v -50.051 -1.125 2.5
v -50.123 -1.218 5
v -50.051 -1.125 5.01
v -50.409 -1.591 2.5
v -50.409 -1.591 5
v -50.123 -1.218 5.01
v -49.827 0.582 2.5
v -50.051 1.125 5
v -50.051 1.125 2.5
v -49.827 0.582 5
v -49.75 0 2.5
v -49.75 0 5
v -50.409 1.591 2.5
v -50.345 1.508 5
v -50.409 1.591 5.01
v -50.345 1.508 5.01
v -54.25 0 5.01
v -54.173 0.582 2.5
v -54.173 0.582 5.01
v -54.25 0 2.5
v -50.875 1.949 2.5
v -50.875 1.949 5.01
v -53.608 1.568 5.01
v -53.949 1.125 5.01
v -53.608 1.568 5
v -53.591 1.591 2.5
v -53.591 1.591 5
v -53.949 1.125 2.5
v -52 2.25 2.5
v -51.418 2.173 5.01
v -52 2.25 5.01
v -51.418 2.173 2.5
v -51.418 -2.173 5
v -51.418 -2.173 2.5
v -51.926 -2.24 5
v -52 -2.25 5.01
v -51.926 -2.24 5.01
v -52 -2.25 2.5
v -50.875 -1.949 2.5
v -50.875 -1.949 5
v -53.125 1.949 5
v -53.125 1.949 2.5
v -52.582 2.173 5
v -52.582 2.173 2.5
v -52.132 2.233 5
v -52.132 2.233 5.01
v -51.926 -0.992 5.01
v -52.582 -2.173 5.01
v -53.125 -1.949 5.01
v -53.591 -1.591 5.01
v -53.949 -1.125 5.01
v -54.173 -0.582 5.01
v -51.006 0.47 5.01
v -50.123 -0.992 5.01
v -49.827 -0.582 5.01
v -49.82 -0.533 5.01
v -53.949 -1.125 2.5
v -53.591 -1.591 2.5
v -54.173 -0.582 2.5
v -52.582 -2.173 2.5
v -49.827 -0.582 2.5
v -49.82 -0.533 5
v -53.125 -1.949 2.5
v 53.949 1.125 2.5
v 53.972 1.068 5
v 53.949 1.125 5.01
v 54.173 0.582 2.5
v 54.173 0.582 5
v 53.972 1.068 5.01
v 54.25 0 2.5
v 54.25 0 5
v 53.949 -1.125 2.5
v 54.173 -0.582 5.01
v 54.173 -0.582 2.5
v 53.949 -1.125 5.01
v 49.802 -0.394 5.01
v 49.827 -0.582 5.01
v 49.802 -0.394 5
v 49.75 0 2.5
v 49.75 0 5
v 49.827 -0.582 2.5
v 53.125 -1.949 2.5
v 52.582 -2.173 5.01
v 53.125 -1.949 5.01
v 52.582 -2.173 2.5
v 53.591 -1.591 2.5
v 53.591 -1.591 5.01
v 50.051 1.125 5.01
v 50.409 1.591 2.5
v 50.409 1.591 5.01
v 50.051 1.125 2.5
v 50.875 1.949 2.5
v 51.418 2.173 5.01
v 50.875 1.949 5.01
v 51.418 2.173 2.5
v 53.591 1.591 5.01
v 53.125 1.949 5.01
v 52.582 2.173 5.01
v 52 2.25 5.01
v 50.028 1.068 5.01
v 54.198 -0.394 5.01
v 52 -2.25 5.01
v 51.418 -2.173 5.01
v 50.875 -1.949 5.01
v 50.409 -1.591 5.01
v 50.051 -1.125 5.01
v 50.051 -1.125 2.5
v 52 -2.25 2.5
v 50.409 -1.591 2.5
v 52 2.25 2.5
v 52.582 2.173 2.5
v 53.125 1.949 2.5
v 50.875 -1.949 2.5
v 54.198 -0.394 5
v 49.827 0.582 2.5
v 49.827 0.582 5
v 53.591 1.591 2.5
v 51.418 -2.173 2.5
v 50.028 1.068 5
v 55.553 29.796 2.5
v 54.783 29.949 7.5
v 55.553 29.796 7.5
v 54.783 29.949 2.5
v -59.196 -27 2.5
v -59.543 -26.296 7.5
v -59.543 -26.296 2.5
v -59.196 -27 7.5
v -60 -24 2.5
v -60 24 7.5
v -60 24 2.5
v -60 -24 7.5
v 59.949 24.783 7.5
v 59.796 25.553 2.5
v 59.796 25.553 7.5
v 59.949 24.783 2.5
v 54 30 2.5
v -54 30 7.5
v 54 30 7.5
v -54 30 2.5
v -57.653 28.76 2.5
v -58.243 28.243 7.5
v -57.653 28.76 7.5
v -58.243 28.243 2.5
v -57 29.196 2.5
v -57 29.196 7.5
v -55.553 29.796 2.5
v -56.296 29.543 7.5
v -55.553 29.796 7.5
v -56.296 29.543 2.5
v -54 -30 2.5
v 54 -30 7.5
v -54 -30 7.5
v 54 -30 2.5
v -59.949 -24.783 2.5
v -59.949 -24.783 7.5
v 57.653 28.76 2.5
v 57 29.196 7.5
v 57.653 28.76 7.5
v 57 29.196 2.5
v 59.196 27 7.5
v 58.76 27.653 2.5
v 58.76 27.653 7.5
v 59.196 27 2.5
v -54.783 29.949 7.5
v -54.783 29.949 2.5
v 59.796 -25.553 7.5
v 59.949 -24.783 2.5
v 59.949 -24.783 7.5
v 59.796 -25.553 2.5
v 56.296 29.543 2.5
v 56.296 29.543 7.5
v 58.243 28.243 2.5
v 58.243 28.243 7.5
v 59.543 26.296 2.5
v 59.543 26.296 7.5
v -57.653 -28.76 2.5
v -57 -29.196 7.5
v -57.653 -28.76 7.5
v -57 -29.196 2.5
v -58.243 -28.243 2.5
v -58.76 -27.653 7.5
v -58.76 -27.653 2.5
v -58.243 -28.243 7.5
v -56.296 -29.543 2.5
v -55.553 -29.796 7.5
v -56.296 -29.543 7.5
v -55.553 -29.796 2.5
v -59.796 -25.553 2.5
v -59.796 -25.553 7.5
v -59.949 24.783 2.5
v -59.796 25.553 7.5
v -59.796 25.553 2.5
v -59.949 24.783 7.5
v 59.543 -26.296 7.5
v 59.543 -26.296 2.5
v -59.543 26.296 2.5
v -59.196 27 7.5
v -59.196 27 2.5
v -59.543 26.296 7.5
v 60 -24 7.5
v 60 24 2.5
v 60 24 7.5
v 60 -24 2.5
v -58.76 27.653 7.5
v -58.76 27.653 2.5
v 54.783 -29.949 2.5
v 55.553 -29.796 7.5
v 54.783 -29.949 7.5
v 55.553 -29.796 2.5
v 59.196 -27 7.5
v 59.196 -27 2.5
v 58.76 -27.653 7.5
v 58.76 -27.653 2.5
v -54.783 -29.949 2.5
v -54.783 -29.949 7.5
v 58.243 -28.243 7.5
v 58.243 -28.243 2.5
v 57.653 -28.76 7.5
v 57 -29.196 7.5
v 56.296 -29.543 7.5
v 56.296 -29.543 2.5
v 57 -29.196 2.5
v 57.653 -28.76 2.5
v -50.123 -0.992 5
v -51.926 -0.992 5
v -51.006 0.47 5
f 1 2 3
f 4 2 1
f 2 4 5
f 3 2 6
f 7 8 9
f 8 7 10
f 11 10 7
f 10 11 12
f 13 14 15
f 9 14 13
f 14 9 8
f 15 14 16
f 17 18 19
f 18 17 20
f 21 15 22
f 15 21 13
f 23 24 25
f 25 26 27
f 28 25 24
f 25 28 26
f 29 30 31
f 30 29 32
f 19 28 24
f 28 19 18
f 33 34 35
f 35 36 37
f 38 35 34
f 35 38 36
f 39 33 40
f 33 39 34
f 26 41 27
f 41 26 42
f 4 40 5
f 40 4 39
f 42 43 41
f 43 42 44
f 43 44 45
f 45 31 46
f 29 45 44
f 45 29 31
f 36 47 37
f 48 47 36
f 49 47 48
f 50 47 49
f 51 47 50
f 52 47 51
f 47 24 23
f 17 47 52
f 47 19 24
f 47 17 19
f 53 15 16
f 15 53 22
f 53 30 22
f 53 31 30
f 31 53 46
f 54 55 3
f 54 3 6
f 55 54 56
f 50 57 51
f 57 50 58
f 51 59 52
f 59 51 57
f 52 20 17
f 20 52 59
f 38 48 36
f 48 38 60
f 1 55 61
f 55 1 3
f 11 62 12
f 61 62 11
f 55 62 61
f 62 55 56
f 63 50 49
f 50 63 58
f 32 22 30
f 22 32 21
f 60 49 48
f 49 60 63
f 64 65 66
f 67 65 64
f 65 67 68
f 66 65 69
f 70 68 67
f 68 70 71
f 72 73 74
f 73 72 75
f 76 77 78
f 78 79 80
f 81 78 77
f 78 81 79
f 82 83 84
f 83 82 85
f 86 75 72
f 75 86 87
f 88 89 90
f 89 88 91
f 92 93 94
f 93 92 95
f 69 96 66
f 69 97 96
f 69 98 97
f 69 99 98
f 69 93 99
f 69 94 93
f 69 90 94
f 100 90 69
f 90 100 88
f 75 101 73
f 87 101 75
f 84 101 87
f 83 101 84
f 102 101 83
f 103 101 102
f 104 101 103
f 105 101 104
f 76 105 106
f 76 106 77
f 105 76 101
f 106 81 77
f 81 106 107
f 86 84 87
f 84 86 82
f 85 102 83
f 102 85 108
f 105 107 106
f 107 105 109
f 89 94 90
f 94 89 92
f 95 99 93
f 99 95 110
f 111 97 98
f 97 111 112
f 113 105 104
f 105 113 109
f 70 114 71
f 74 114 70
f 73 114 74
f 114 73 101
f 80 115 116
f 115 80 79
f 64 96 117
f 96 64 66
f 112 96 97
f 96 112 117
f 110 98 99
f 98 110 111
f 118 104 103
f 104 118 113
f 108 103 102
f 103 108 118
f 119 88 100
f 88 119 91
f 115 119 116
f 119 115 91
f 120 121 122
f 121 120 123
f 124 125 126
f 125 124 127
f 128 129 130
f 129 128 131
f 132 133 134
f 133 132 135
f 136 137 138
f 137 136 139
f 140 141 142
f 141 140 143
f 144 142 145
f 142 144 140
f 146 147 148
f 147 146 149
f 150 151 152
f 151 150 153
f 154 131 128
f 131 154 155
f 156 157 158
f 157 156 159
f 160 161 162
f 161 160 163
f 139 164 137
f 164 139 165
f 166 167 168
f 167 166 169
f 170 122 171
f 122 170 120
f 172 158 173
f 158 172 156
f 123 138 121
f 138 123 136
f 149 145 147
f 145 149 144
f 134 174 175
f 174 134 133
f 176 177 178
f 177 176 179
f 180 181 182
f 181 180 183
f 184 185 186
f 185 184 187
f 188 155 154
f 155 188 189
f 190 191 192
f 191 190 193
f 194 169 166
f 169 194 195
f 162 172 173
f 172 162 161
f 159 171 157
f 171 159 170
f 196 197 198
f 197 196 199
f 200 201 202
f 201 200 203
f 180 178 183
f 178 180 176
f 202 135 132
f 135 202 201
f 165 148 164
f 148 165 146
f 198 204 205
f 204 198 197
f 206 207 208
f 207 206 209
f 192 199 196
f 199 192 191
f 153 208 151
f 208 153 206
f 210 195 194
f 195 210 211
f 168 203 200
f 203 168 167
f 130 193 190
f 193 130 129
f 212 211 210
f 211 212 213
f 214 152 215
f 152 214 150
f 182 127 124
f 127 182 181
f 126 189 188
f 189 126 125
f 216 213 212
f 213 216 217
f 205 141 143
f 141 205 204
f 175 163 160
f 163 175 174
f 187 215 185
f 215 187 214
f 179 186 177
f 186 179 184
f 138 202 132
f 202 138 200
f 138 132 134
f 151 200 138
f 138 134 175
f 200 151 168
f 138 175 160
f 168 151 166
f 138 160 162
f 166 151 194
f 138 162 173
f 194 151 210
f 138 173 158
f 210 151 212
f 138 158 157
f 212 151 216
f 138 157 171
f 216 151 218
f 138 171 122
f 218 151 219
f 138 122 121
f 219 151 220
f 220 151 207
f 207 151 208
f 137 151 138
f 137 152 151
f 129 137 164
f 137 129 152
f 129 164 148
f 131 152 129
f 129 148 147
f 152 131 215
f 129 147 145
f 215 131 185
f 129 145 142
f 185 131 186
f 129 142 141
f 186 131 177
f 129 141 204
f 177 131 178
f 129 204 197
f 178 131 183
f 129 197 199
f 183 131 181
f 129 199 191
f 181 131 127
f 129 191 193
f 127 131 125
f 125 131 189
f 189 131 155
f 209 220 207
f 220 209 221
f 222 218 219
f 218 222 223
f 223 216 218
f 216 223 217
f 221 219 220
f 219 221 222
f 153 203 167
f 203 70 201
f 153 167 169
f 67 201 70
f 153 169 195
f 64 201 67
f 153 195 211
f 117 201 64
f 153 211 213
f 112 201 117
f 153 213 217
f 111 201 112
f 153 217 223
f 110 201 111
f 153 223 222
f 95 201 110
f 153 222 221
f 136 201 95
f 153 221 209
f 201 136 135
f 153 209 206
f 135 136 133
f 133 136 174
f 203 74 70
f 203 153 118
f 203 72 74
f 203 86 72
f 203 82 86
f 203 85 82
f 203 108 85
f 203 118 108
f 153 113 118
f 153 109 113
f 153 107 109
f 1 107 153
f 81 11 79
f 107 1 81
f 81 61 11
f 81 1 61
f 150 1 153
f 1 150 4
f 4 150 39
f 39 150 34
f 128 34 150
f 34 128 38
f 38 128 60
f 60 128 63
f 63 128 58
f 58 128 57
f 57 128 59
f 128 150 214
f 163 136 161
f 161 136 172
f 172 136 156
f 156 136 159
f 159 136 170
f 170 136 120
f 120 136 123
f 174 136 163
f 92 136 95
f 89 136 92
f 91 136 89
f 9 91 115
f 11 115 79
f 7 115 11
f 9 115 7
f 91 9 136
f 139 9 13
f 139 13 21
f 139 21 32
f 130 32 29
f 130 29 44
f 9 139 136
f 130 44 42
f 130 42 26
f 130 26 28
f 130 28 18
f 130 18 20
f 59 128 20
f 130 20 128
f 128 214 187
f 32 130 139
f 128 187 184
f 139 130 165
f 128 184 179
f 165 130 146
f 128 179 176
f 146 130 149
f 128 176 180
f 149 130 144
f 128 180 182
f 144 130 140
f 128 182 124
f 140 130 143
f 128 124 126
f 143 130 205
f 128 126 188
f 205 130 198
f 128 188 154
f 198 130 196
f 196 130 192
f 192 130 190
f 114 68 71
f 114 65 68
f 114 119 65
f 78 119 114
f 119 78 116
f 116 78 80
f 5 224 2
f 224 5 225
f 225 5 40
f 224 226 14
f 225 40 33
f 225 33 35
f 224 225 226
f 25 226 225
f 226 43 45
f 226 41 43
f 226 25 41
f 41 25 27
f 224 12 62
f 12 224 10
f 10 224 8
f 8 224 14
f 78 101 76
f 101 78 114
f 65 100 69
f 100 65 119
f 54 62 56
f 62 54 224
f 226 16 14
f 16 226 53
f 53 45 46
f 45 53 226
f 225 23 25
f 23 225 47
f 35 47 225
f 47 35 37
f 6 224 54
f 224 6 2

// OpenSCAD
// Wall Plaque with decorative border frame and optional mounting holes

w          = 120;   // overall width (mm)
h          = 60;    // overall height (mm)
th         = 5.0;   // base thickness (mm)
border_w   = 5.0;   // border frame width (mm)
border_th  = 1.5;   // how much the border frame is raised above the base (mm)
corner_r   = 6.0;   // outer corner radius (mm)
mount_holes= 1;     // 1 = include mounting holes
hole_d     = 4.5;   // mounting hole diameter (mm)
hole_margin= 8.0;   // hole center distance from edge (mm)

// Text
line1      = "YOUR NAME";
line2      = "";
line3      = "";
text_size  = 14;
text_height= 1.2;
line_gap   = 9;
pad_x      = 6;
pad_y      = 5;
text_align = "center";
emboss     = 1;
offset_x   = 0;
offset_y   = 0;

// Emblem
emblem_enabled = 0;
emblem_path    = "";
emblem_kind    = "svg";
emblem_scale   = 0.25;
emblem_x       = 0;
emblem_y       = 0;
emblem_rot     = 0;
emblem_mode    = 1;
emblem_depth   = 1.2;
emblem_invert  = 0;

$fa = 4; $fs = 0.5;

inner_r = max(0, corner_r - border_w);

function text_anchor(align) =
    align == "left"  ? "left" :
    align == "right" ? "right" : "center";

module rounded_plate(pw, ph, r, thick) {
    if (r <= 0) {
        cube([pw, ph, thick], center = true);
    } else {
        hull() {
            for (dx = [-1, 1], dy = [-1, 1]) {
                translate([dx * (pw/2 - r), dy * (ph/2 - r), 0])
                cylinder(r = r, h = thick, $fn = 48);
            }
        }
    }
}

module border_frame() {
    if (border_w > 0 && border_th > 0) {
        difference() {
            translate([0, 0, th/2 + border_th/2])
            rounded_plate(w, h, corner_r, border_th);

            translate([0, 0, th/2 + border_th/2 - 0.01])
            rounded_plate(w - 2*border_w, h - 2*border_w, inner_r, border_th + 0.02);
        }
    }
}

module text_line(line, y_off) {
    translate([offset_x, offset_y + y_off, 0])
    text(line, size = text_size,
         halign = text_anchor(text_align), valign = "center", $fn = 24);
}

module text_2d() {
    active = (line1 != "" ? 1 : 0) + (line2 != "" ? 1 : 0) + (line3 != "" ? 1 : 0);
    y0 = (active > 1) ? (active - 1) * line_gap / 2 : 0;
    if (line1 != "") text_line(line1, y0);
    if (line2 != "") text_line(line2, y0 - line_gap);
    if (line3 != "") text_line(line3, y0 - 2*line_gap);
}

module emblem_shape() {
    if (emblem_kind == "heightmap" && emblem_path != "") {
        scale([emblem_scale, emblem_scale, emblem_depth / 2])
        translate([0, 0, 1])
        surface(file = emblem_path, center = true);
    } else if (emblem_path != "") {
        scale([emblem_scale, emblem_scale, 1])
        linear_extrude(height = emblem_depth)
        import(emblem_path);
    }
}

// Base
difference() {
    translate([0, 0, th/2])
    rounded_plate(w, h, corner_r, th);

    // Engraved text
    if (emboss == 0) {
        translate([0, 0, th + 0.01])
        linear_extrude(height = text_height + 0.02, center = false)
        mirror([0, 0, 0]) text_2d();
    }

    // Mounting holes
    if (mount_holes == 1) {
        for (dx = [-1, 1]) {
            translate([dx * (w/2 - hole_margin), 0, -0.01])
            cylinder(d = hole_d, h = th + 0.02, $fn = 24);
        }
    }
}

// Border frame
border_frame();

// Embossed text
if (emboss == 1) {
    translate([0, 0, th])
    linear_extrude(height = text_height)
    text_2d();
}

// Emblem
if (emblem_enabled == 1 && emblem_path != "") {
    translate([emblem_x, emblem_y, th])
    rotate([0, 0, emblem_rot])
    emblem_shape();
}
